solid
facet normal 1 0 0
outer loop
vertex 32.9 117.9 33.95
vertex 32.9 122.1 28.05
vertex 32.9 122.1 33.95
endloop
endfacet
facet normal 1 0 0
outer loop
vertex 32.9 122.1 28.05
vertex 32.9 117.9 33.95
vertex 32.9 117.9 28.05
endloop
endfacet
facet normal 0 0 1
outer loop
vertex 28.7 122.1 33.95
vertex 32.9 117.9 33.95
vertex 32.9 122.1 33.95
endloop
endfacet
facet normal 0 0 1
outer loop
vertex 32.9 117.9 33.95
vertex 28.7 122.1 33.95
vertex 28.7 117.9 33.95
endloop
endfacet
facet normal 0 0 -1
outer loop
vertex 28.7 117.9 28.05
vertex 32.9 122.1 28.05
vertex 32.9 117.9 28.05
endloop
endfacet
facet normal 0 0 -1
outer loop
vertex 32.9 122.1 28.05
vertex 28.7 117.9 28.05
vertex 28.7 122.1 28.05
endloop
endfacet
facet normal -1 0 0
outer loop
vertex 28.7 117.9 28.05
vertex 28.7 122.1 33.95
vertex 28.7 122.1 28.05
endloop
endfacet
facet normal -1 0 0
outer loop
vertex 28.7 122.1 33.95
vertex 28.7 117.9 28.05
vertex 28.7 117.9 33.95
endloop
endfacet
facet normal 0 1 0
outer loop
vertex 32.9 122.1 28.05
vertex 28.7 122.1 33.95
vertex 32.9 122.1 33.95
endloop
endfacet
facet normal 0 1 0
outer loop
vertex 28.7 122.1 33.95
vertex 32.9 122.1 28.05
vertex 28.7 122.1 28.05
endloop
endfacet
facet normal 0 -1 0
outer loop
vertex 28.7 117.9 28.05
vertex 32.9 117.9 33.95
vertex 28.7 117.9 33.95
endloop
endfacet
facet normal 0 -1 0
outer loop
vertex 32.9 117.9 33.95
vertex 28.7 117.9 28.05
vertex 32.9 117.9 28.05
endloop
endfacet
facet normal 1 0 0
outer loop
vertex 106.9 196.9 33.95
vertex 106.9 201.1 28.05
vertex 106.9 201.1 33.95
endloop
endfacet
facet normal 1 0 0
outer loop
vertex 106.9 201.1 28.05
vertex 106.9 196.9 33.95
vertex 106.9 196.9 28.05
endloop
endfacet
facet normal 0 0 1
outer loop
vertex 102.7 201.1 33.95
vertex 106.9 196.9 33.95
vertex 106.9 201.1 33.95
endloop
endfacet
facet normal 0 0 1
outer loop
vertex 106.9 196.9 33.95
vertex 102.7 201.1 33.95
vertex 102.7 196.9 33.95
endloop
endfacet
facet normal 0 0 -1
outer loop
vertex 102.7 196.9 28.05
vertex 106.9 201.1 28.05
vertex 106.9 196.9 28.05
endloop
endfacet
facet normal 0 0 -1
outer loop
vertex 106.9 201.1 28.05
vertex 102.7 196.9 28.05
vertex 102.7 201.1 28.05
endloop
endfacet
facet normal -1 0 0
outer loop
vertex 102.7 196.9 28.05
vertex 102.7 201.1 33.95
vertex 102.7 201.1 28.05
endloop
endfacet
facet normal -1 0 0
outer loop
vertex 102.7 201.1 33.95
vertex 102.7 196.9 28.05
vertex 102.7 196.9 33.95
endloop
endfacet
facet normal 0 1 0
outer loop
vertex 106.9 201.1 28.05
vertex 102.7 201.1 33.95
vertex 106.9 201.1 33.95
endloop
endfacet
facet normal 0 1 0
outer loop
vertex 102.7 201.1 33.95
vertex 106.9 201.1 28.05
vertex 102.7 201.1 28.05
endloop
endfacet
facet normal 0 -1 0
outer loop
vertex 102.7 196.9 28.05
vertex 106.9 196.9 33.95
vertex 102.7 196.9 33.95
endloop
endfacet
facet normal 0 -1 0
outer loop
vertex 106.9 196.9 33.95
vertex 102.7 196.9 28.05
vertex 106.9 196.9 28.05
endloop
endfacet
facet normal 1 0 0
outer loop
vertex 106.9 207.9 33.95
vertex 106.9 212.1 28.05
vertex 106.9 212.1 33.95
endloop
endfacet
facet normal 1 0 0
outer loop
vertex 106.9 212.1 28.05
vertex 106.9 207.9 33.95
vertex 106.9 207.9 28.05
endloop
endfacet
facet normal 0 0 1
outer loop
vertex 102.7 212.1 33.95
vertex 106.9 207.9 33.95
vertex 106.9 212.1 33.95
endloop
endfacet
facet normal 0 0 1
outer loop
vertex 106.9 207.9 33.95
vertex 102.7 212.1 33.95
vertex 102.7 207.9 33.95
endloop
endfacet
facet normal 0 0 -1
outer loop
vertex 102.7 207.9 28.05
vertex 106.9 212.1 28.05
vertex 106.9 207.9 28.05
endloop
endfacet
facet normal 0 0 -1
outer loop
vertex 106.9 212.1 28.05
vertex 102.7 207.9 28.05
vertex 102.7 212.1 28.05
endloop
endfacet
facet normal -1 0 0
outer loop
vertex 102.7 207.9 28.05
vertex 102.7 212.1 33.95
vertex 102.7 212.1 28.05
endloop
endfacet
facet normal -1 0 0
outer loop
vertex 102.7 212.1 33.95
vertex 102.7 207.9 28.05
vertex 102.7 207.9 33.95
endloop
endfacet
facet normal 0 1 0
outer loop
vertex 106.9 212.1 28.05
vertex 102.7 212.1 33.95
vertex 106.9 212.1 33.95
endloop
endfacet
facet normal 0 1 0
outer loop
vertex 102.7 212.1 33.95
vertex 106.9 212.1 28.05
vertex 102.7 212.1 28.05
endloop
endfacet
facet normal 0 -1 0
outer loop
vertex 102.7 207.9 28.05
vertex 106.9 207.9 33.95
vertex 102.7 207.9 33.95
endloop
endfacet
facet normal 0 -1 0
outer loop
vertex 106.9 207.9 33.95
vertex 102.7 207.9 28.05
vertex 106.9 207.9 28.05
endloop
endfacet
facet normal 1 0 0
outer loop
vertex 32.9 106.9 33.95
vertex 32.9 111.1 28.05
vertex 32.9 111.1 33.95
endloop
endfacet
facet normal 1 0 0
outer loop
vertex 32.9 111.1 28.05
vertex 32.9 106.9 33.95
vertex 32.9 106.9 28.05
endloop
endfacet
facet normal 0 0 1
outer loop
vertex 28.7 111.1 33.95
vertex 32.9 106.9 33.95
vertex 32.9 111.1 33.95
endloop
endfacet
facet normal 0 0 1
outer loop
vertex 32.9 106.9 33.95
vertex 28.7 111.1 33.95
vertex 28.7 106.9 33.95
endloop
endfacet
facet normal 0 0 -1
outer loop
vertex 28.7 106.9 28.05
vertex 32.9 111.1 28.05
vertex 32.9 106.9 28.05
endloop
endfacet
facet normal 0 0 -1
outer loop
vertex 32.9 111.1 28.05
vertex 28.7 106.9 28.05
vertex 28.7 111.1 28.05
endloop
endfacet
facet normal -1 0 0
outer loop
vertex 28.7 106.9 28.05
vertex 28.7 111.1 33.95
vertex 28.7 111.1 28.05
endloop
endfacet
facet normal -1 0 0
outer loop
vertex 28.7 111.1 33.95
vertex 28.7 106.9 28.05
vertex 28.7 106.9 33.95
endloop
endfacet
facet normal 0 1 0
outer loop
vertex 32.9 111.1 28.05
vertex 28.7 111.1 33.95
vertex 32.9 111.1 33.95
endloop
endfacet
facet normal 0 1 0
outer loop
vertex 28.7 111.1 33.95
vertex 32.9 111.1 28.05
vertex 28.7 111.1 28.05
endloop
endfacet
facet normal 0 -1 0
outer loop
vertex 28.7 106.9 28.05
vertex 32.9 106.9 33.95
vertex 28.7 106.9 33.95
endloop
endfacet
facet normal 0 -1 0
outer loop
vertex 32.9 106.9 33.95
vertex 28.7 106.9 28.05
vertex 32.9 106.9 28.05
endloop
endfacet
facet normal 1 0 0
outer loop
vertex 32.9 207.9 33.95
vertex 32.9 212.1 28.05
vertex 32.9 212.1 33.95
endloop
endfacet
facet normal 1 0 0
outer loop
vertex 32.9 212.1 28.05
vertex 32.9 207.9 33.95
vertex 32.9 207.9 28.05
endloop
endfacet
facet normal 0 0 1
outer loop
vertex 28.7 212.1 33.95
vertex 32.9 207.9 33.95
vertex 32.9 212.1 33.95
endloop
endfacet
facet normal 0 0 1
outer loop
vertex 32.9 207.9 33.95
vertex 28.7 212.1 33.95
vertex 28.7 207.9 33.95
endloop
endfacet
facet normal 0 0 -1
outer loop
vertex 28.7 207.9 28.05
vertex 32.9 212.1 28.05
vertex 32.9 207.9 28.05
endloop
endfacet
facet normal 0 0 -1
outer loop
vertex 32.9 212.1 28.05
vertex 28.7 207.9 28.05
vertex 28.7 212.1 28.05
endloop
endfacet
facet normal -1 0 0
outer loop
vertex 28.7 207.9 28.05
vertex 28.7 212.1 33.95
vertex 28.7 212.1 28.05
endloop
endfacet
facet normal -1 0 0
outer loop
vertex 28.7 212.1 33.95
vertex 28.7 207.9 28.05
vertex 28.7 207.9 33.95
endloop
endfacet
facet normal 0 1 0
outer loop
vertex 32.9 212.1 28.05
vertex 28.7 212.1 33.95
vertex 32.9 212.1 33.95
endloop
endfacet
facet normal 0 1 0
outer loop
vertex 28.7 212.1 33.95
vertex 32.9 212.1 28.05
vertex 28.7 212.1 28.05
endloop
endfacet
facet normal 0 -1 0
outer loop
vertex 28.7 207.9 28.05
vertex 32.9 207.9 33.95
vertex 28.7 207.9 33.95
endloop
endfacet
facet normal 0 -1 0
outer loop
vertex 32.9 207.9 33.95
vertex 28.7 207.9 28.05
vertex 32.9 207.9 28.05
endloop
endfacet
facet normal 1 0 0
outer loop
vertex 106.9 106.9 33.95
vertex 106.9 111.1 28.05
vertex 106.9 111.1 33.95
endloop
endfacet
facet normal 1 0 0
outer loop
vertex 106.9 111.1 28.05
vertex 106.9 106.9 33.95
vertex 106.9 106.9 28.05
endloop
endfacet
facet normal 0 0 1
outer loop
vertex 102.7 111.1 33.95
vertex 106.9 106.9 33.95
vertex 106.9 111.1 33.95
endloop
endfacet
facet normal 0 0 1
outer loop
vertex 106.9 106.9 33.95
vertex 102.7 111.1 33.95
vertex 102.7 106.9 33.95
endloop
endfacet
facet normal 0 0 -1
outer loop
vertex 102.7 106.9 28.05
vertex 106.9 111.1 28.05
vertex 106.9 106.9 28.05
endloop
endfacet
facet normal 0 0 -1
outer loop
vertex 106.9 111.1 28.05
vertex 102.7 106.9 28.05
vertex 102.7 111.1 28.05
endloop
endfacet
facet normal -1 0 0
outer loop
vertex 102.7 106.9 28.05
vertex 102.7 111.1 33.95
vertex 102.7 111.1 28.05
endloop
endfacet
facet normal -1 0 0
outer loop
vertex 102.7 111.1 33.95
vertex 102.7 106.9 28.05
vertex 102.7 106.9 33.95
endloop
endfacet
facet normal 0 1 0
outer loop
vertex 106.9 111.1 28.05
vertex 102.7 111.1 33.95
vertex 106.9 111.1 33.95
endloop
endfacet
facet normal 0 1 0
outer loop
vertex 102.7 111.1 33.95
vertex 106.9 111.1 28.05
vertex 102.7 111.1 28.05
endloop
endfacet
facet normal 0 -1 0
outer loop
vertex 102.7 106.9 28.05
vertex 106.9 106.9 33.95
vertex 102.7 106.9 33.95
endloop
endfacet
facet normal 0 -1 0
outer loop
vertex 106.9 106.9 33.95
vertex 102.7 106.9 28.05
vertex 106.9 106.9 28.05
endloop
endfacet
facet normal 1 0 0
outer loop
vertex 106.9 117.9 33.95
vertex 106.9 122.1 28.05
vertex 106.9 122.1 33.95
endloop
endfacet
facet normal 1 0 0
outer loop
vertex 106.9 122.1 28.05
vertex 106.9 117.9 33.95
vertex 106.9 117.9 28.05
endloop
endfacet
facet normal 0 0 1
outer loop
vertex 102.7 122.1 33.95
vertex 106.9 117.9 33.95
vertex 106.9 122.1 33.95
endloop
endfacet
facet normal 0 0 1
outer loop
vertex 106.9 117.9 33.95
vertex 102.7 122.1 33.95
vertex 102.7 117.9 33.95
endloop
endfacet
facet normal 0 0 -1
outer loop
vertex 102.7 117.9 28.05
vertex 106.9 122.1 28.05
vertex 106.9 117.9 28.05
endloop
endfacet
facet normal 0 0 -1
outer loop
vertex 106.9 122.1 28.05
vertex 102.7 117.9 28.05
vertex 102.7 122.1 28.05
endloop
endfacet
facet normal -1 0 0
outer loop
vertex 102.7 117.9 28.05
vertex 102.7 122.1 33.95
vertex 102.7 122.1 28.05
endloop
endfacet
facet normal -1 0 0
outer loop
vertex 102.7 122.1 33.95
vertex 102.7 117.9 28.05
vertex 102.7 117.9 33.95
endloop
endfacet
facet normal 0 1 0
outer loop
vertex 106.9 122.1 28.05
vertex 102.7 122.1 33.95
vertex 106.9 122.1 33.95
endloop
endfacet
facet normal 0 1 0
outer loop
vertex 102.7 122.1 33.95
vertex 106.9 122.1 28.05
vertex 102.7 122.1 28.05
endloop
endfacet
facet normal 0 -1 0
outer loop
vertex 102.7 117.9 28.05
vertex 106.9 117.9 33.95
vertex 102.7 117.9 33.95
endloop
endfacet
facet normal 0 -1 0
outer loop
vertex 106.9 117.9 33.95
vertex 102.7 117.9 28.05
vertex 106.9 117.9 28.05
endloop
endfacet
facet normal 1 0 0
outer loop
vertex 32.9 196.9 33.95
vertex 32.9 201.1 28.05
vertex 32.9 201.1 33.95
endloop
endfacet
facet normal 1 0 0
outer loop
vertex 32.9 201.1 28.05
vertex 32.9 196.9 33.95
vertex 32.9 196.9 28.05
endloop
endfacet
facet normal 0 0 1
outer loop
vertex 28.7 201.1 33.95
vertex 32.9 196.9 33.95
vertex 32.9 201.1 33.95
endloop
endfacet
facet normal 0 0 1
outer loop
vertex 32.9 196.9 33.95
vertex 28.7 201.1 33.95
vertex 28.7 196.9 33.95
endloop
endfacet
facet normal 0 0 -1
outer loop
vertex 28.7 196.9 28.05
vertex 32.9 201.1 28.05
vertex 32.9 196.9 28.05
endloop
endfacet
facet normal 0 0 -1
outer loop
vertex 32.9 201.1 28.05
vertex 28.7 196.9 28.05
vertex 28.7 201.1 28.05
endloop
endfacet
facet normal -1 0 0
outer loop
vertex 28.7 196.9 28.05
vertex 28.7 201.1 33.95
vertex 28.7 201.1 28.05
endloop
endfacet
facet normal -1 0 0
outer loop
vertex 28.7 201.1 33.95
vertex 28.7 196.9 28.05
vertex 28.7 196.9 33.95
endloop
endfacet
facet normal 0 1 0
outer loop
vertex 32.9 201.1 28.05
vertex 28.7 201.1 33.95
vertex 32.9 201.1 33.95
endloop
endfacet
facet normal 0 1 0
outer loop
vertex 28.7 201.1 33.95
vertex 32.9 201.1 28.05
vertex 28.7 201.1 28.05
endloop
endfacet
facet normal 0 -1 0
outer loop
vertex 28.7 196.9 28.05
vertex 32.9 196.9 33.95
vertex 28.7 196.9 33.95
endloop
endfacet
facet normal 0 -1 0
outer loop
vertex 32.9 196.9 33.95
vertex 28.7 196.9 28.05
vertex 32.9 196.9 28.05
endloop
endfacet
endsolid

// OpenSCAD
// Generated by spec/prepare_parent_retrofit_printing.py from validated release fasteners. NOT A PRINTABLE PART.
union(){
translate([28.7, 117.9, 28.05]) cube([4.2, 4.2, 5.9]);
translate([102.7, 196.9, 28.05]) cube([4.2, 4.2, 5.9]);
translate([102.7, 207.9, 28.05]) cube([4.2, 4.2, 5.9]);
translate([28.699999999999996, 106.9, 28.05]) cube([4.2, 4.2, 5.9]);
translate([28.7, 207.9, 28.05]) cube([4.2, 4.2, 5.9]);
translate([102.7, 106.9, 28.05]) cube([4.2, 4.2, 5.9]);
translate([102.7, 117.9, 28.05]) cube([4.2, 4.2, 5.9]);
translate([28.699999999999996, 196.9, 28.05]) cube([4.2, 4.2, 5.9]);
}
